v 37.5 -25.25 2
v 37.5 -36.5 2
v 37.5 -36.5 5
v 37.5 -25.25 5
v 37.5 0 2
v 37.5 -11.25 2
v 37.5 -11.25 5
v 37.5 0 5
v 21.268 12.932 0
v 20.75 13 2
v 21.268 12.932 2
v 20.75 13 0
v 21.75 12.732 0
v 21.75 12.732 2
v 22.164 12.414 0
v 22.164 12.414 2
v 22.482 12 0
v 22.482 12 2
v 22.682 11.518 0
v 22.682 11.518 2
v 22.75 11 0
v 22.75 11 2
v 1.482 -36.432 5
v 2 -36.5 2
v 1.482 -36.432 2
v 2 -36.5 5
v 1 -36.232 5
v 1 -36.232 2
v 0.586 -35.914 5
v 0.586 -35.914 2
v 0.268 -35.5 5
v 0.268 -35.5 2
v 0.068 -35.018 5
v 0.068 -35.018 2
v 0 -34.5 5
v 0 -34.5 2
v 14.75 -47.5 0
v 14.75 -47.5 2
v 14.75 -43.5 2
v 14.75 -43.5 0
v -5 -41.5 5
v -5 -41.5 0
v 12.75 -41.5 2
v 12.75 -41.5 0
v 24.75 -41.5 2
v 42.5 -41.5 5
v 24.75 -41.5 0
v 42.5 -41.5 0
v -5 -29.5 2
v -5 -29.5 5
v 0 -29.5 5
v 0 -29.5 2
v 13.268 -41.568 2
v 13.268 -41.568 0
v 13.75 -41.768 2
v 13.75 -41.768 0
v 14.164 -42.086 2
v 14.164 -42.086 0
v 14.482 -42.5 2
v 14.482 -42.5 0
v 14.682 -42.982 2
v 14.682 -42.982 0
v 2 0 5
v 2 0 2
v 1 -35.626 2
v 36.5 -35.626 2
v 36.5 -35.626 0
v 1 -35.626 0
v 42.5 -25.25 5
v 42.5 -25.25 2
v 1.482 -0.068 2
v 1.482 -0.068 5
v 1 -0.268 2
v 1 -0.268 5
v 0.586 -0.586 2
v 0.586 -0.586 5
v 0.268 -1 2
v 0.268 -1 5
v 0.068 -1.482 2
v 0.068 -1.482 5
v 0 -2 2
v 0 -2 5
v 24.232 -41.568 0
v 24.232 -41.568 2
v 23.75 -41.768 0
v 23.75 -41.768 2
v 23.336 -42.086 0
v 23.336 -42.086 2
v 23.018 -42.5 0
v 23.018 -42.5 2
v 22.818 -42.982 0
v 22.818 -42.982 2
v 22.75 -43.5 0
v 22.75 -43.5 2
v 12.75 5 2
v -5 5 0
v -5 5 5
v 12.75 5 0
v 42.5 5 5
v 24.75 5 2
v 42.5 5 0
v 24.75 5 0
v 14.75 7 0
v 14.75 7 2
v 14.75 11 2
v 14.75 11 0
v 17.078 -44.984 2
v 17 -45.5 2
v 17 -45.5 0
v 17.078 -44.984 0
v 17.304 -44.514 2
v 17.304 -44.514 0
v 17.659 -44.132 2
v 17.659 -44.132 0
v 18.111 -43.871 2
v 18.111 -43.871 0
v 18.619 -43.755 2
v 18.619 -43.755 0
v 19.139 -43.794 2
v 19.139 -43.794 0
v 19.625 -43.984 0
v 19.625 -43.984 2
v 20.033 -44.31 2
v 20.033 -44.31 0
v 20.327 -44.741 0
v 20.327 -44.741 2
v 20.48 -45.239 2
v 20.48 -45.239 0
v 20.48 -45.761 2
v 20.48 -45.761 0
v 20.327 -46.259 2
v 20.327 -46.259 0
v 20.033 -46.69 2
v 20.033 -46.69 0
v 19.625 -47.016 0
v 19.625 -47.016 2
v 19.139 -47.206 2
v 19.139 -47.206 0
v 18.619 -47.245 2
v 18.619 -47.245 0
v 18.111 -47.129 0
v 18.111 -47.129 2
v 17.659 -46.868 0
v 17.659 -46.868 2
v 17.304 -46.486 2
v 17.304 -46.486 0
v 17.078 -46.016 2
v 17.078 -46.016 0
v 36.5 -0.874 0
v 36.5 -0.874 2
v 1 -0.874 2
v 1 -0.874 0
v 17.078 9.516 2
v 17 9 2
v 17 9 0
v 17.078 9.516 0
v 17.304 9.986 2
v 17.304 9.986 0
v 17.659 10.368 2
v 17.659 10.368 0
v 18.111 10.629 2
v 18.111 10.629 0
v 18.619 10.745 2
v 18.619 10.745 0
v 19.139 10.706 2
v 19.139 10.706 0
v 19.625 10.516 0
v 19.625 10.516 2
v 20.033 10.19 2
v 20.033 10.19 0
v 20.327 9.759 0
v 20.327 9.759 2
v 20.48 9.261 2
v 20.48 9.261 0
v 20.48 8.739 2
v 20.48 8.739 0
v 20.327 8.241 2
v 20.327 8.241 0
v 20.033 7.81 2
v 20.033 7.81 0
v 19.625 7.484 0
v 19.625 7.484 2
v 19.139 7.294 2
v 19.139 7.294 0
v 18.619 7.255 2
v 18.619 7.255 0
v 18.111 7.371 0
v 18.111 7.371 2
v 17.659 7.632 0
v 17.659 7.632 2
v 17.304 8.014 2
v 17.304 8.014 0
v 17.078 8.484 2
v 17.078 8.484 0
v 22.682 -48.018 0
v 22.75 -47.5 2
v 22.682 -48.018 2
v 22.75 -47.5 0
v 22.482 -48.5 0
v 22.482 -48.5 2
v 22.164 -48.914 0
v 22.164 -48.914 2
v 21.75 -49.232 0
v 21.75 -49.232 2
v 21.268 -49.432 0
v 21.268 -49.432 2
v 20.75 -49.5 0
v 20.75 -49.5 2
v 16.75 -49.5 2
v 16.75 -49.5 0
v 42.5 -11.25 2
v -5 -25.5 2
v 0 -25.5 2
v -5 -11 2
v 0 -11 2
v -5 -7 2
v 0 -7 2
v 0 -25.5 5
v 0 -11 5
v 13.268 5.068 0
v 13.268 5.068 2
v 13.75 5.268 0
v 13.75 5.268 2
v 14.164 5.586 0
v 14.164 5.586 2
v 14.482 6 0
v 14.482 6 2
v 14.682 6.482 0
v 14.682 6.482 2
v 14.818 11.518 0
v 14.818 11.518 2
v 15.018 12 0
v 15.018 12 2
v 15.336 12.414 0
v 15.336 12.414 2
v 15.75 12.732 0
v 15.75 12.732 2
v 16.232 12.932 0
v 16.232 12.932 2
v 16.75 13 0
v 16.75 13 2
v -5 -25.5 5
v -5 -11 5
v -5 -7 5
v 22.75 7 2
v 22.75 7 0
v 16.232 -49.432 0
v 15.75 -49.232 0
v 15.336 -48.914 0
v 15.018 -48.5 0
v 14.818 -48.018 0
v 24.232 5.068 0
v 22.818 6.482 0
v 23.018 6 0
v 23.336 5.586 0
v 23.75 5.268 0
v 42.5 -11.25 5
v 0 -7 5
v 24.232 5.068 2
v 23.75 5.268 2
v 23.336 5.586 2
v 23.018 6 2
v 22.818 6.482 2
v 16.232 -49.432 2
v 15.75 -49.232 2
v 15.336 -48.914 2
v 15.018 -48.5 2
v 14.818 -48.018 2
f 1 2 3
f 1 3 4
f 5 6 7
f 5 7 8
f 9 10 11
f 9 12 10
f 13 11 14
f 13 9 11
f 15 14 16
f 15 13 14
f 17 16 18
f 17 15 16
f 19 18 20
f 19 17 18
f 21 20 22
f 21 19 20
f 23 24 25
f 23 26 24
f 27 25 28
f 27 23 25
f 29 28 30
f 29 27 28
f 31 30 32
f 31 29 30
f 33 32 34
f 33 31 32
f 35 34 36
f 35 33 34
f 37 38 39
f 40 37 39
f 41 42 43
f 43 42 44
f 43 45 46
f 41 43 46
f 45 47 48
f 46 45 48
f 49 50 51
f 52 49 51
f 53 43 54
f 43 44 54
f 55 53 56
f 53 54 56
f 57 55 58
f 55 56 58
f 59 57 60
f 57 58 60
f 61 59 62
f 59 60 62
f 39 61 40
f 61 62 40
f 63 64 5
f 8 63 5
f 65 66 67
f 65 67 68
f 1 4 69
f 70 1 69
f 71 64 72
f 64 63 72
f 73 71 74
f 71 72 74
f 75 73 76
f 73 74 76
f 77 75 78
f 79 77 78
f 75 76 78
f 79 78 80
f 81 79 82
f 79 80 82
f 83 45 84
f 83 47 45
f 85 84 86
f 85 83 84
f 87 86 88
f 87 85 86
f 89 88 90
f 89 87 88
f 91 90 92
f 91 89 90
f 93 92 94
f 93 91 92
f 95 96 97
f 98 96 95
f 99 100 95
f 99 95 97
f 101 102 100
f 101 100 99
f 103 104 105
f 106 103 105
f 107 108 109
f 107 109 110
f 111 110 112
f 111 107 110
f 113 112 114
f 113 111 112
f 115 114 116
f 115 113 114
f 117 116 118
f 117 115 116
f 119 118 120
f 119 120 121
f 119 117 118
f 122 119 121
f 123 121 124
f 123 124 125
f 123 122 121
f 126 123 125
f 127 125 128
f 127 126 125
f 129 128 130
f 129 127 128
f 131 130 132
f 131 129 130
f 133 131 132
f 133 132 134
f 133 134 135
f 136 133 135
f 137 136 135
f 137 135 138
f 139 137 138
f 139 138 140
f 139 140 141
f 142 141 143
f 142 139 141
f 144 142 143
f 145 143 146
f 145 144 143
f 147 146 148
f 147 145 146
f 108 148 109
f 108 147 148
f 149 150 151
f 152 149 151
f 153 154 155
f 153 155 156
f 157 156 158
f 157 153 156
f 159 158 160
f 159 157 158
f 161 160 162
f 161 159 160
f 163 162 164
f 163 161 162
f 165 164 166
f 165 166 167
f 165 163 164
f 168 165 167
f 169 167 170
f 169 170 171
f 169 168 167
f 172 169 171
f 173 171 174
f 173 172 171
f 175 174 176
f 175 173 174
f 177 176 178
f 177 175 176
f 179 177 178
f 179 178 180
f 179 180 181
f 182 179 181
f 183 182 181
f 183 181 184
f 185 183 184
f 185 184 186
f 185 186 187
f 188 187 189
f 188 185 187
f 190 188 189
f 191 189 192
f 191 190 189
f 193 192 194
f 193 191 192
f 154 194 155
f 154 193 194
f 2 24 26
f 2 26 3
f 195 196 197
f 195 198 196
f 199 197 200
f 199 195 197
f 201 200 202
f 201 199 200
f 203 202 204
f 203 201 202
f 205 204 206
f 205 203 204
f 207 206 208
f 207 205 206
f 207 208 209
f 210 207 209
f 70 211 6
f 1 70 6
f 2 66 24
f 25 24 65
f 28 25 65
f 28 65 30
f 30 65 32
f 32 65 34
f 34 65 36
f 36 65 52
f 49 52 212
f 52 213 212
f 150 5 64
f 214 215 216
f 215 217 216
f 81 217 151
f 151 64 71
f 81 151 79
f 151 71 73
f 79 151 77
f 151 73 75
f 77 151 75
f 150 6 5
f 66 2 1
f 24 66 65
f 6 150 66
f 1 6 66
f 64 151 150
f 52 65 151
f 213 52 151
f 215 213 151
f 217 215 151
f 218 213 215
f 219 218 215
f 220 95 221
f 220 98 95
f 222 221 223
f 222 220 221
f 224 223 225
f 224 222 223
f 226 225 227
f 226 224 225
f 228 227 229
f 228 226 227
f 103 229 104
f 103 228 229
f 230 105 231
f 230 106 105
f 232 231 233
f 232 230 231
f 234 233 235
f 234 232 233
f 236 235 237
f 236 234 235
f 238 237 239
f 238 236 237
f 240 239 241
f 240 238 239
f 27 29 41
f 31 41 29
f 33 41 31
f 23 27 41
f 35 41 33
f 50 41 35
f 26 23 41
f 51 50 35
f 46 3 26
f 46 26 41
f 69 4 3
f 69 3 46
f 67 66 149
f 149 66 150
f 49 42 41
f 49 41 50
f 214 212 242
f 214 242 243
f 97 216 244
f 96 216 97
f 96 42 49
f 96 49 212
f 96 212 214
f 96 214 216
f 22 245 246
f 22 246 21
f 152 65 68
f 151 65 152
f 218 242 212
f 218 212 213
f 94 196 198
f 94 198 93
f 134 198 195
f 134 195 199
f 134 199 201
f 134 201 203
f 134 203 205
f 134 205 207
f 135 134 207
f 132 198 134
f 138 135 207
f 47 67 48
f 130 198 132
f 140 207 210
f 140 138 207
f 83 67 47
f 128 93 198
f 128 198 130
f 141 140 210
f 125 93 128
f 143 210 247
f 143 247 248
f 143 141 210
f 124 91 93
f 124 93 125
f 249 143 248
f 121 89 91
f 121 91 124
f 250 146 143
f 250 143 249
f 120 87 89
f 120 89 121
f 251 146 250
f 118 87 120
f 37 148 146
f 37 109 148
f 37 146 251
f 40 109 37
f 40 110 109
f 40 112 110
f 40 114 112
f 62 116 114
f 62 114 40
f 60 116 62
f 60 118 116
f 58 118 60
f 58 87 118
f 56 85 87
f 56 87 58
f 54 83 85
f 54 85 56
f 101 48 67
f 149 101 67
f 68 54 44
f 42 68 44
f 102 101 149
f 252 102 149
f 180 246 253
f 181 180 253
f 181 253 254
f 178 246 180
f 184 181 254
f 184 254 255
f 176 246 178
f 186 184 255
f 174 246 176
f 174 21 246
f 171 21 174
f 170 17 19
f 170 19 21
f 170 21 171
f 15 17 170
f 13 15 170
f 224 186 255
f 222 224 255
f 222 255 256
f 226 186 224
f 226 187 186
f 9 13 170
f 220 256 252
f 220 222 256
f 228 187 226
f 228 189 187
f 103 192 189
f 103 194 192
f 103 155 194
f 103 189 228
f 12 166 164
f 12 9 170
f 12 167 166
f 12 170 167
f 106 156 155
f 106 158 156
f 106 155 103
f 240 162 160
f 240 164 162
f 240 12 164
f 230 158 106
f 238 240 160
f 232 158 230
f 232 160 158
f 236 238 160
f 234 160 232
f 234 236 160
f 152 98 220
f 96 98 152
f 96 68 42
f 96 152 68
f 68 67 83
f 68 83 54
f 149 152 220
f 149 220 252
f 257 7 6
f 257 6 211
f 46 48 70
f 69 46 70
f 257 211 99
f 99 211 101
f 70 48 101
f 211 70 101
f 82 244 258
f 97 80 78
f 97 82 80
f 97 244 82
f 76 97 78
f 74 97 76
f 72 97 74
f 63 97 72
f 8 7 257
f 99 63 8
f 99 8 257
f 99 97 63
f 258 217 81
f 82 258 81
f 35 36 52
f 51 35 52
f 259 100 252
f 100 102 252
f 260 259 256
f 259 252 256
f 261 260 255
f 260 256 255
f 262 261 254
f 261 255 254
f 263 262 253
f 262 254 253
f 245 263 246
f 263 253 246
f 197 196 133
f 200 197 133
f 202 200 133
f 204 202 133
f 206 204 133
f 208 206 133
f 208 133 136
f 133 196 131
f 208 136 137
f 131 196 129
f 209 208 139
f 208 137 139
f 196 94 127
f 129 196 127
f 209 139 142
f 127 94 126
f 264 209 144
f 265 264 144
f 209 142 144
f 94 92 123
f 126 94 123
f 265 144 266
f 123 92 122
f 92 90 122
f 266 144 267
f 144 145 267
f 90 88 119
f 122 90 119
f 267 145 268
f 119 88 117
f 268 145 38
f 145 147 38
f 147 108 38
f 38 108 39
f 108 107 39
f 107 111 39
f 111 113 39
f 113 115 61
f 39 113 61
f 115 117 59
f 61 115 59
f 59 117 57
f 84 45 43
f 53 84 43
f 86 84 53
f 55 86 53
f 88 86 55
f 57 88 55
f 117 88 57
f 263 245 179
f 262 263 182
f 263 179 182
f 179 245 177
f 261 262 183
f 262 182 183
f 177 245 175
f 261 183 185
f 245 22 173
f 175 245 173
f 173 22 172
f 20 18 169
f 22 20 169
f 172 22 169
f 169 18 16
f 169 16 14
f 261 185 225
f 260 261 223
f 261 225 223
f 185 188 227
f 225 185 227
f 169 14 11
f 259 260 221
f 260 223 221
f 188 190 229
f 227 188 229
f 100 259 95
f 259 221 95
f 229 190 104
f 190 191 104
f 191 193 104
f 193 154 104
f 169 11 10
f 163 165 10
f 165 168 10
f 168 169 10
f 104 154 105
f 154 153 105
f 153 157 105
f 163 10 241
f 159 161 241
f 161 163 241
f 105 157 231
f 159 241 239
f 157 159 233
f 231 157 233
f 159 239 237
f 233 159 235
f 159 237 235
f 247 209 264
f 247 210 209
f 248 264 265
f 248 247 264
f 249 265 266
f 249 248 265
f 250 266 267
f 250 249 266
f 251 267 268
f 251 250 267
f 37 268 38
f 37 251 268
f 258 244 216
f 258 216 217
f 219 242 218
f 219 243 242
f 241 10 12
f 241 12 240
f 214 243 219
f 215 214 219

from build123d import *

# Parameters (mm, degrees)
SKETCH1_W                 = 37.5
SKETCH1_H                 = 36.5
BOSS_EXTRUDE1_DEPTH       = 5
SHELL1_T                  = 5
BOSS_EXTRUDE2_START       = -2
BOSS_EXTRUDE2_OUTLINE_W   = 8
BOSS_EXTRUDE2_OUTLINE_H   = 8
BOSS_EXTRUDE2_OUTLINE_R   = 1.75
BOSS_EXTRUDE2_OUTLINE_W_2 = 37.5
BOSS_EXTRUDE2_OUTLINE_H_2 = 36.5
BOSS_EXTRUDE2_OUTLINE_W_3 = 35.5
BOSS_EXTRUDE2_OUTLINE_H_3 = 34.752631578
BOSS_EXTRUDE2_DEPTH       = 2
SKETCH3_W                 = 5
SKETCH3_H                 = 4
SKETCH3_H_2               = 14
CUT_EXTRUDE2_DEPTH        = 3
FILLET1_R                 = 2


# Read off the part's stored shape, not the designer's step: Boss-Extrude2
with BuildPart() as part:
    # Sketch1 → Boss-Extrude1 (new body)
    with BuildSketch(Plane.XY):
        with Locations((18.75, -18.25)):
            Rectangle(SKETCH1_W, SKETCH1_H)
    extrude(amount=BOSS_EXTRUDE1_DEPTH)

    # Shell1
    shell1_openings = [part.faces().sort_by_distance(p)[0] for p in [
        (18.75, -18.25, 0),
        (18.75, -18.25, 5),
    ]]
    offset(amount=SHELL1_T, openings=shell1_openings, kind=Kind.INTERSECTION)

    # Boss-Extrude2 outline → Boss-Extrude2 (add)
    # profile 1 of 3: a face of its own
    with BuildSketch(Plane(origin=(0, 0, 0), x_dir=(-1, 0, 0), z_dir=(0, 0, -1)).offset(BOSS_EXTRUDE2_START)):
        with Locations((-18.75, 9)):
            Rectangle(BOSS_EXTRUDE2_OUTLINE_W, BOSS_EXTRUDE2_OUTLINE_H)
        with Locations((-18.75, 9)):
            Circle(BOSS_EXTRUDE2_OUTLINE_R, mode=Mode.SUBTRACT)
    # profile 2 of 3: a face of its own
    with BuildSketch(Plane(origin=(0, 0, 0), x_dir=(-1, 0, 0), z_dir=(0, 0, -1)).offset(BOSS_EXTRUDE2_START)):
        with Locations((-18.75, -45.5)):
            Rectangle(BOSS_EXTRUDE2_OUTLINE_W, BOSS_EXTRUDE2_OUTLINE_H)
        with Locations((-18.75, -45.5)):
            Circle(BOSS_EXTRUDE2_OUTLINE_R, mode=Mode.SUBTRACT)
    # profile 3 of 3: a face of its own
    with BuildSketch(Plane(origin=(0, 0, 0), x_dir=(-1, 0, 0), z_dir=(0, 0, -1)).offset(BOSS_EXTRUDE2_START)):
        with Locations((-18.75, -18.25)):
            Rectangle(BOSS_EXTRUDE2_OUTLINE_W_2, BOSS_EXTRUDE2_OUTLINE_H_2)
        with Locations((-18.75, -18.25)):
            Rectangle(BOSS_EXTRUDE2_OUTLINE_W_3, BOSS_EXTRUDE2_OUTLINE_H_3, mode=Mode.SUBTRACT)
    extrude(amount=BOSS_EXTRUDE2_DEPTH)

    # Sketch3 → Cut-Extrude2 (cut)
    with BuildSketch(Plane.XY.offset(5)):
        with Locations((-2.5, -9)):
            Rectangle(SKETCH3_W, SKETCH3_H)
        with Locations((-2.5, -27.5)):
            Rectangle(SKETCH3_W, SKETCH3_H)
        with Locations((40, -18.25)):
            Rectangle(SKETCH3_W, SKETCH3_H_2)
    extrude(amount=-CUT_EXTRUDE2_DEPTH, mode=Mode.SUBTRACT)

    # Fillet1
    fillet1_edges = [part.edges().sort_by_distance(p)[0] for p in [
        (0, 0, 3.5),
        (0, -36.5, 3.5),
        (22.75, -41.5, 1),
        (22.75, 5, 1),
        (22.75, 13, 1),
        (14.75, 13, 1),
        (14.75, 5, 1),
        (14.75, -41.5, 1),
        (14.75, -49.5, 1),
        (22.75, -49.5, 1),
    ]]
    fillet(fillet1_edges, radius=FILLET1_R)


solid = part.part
